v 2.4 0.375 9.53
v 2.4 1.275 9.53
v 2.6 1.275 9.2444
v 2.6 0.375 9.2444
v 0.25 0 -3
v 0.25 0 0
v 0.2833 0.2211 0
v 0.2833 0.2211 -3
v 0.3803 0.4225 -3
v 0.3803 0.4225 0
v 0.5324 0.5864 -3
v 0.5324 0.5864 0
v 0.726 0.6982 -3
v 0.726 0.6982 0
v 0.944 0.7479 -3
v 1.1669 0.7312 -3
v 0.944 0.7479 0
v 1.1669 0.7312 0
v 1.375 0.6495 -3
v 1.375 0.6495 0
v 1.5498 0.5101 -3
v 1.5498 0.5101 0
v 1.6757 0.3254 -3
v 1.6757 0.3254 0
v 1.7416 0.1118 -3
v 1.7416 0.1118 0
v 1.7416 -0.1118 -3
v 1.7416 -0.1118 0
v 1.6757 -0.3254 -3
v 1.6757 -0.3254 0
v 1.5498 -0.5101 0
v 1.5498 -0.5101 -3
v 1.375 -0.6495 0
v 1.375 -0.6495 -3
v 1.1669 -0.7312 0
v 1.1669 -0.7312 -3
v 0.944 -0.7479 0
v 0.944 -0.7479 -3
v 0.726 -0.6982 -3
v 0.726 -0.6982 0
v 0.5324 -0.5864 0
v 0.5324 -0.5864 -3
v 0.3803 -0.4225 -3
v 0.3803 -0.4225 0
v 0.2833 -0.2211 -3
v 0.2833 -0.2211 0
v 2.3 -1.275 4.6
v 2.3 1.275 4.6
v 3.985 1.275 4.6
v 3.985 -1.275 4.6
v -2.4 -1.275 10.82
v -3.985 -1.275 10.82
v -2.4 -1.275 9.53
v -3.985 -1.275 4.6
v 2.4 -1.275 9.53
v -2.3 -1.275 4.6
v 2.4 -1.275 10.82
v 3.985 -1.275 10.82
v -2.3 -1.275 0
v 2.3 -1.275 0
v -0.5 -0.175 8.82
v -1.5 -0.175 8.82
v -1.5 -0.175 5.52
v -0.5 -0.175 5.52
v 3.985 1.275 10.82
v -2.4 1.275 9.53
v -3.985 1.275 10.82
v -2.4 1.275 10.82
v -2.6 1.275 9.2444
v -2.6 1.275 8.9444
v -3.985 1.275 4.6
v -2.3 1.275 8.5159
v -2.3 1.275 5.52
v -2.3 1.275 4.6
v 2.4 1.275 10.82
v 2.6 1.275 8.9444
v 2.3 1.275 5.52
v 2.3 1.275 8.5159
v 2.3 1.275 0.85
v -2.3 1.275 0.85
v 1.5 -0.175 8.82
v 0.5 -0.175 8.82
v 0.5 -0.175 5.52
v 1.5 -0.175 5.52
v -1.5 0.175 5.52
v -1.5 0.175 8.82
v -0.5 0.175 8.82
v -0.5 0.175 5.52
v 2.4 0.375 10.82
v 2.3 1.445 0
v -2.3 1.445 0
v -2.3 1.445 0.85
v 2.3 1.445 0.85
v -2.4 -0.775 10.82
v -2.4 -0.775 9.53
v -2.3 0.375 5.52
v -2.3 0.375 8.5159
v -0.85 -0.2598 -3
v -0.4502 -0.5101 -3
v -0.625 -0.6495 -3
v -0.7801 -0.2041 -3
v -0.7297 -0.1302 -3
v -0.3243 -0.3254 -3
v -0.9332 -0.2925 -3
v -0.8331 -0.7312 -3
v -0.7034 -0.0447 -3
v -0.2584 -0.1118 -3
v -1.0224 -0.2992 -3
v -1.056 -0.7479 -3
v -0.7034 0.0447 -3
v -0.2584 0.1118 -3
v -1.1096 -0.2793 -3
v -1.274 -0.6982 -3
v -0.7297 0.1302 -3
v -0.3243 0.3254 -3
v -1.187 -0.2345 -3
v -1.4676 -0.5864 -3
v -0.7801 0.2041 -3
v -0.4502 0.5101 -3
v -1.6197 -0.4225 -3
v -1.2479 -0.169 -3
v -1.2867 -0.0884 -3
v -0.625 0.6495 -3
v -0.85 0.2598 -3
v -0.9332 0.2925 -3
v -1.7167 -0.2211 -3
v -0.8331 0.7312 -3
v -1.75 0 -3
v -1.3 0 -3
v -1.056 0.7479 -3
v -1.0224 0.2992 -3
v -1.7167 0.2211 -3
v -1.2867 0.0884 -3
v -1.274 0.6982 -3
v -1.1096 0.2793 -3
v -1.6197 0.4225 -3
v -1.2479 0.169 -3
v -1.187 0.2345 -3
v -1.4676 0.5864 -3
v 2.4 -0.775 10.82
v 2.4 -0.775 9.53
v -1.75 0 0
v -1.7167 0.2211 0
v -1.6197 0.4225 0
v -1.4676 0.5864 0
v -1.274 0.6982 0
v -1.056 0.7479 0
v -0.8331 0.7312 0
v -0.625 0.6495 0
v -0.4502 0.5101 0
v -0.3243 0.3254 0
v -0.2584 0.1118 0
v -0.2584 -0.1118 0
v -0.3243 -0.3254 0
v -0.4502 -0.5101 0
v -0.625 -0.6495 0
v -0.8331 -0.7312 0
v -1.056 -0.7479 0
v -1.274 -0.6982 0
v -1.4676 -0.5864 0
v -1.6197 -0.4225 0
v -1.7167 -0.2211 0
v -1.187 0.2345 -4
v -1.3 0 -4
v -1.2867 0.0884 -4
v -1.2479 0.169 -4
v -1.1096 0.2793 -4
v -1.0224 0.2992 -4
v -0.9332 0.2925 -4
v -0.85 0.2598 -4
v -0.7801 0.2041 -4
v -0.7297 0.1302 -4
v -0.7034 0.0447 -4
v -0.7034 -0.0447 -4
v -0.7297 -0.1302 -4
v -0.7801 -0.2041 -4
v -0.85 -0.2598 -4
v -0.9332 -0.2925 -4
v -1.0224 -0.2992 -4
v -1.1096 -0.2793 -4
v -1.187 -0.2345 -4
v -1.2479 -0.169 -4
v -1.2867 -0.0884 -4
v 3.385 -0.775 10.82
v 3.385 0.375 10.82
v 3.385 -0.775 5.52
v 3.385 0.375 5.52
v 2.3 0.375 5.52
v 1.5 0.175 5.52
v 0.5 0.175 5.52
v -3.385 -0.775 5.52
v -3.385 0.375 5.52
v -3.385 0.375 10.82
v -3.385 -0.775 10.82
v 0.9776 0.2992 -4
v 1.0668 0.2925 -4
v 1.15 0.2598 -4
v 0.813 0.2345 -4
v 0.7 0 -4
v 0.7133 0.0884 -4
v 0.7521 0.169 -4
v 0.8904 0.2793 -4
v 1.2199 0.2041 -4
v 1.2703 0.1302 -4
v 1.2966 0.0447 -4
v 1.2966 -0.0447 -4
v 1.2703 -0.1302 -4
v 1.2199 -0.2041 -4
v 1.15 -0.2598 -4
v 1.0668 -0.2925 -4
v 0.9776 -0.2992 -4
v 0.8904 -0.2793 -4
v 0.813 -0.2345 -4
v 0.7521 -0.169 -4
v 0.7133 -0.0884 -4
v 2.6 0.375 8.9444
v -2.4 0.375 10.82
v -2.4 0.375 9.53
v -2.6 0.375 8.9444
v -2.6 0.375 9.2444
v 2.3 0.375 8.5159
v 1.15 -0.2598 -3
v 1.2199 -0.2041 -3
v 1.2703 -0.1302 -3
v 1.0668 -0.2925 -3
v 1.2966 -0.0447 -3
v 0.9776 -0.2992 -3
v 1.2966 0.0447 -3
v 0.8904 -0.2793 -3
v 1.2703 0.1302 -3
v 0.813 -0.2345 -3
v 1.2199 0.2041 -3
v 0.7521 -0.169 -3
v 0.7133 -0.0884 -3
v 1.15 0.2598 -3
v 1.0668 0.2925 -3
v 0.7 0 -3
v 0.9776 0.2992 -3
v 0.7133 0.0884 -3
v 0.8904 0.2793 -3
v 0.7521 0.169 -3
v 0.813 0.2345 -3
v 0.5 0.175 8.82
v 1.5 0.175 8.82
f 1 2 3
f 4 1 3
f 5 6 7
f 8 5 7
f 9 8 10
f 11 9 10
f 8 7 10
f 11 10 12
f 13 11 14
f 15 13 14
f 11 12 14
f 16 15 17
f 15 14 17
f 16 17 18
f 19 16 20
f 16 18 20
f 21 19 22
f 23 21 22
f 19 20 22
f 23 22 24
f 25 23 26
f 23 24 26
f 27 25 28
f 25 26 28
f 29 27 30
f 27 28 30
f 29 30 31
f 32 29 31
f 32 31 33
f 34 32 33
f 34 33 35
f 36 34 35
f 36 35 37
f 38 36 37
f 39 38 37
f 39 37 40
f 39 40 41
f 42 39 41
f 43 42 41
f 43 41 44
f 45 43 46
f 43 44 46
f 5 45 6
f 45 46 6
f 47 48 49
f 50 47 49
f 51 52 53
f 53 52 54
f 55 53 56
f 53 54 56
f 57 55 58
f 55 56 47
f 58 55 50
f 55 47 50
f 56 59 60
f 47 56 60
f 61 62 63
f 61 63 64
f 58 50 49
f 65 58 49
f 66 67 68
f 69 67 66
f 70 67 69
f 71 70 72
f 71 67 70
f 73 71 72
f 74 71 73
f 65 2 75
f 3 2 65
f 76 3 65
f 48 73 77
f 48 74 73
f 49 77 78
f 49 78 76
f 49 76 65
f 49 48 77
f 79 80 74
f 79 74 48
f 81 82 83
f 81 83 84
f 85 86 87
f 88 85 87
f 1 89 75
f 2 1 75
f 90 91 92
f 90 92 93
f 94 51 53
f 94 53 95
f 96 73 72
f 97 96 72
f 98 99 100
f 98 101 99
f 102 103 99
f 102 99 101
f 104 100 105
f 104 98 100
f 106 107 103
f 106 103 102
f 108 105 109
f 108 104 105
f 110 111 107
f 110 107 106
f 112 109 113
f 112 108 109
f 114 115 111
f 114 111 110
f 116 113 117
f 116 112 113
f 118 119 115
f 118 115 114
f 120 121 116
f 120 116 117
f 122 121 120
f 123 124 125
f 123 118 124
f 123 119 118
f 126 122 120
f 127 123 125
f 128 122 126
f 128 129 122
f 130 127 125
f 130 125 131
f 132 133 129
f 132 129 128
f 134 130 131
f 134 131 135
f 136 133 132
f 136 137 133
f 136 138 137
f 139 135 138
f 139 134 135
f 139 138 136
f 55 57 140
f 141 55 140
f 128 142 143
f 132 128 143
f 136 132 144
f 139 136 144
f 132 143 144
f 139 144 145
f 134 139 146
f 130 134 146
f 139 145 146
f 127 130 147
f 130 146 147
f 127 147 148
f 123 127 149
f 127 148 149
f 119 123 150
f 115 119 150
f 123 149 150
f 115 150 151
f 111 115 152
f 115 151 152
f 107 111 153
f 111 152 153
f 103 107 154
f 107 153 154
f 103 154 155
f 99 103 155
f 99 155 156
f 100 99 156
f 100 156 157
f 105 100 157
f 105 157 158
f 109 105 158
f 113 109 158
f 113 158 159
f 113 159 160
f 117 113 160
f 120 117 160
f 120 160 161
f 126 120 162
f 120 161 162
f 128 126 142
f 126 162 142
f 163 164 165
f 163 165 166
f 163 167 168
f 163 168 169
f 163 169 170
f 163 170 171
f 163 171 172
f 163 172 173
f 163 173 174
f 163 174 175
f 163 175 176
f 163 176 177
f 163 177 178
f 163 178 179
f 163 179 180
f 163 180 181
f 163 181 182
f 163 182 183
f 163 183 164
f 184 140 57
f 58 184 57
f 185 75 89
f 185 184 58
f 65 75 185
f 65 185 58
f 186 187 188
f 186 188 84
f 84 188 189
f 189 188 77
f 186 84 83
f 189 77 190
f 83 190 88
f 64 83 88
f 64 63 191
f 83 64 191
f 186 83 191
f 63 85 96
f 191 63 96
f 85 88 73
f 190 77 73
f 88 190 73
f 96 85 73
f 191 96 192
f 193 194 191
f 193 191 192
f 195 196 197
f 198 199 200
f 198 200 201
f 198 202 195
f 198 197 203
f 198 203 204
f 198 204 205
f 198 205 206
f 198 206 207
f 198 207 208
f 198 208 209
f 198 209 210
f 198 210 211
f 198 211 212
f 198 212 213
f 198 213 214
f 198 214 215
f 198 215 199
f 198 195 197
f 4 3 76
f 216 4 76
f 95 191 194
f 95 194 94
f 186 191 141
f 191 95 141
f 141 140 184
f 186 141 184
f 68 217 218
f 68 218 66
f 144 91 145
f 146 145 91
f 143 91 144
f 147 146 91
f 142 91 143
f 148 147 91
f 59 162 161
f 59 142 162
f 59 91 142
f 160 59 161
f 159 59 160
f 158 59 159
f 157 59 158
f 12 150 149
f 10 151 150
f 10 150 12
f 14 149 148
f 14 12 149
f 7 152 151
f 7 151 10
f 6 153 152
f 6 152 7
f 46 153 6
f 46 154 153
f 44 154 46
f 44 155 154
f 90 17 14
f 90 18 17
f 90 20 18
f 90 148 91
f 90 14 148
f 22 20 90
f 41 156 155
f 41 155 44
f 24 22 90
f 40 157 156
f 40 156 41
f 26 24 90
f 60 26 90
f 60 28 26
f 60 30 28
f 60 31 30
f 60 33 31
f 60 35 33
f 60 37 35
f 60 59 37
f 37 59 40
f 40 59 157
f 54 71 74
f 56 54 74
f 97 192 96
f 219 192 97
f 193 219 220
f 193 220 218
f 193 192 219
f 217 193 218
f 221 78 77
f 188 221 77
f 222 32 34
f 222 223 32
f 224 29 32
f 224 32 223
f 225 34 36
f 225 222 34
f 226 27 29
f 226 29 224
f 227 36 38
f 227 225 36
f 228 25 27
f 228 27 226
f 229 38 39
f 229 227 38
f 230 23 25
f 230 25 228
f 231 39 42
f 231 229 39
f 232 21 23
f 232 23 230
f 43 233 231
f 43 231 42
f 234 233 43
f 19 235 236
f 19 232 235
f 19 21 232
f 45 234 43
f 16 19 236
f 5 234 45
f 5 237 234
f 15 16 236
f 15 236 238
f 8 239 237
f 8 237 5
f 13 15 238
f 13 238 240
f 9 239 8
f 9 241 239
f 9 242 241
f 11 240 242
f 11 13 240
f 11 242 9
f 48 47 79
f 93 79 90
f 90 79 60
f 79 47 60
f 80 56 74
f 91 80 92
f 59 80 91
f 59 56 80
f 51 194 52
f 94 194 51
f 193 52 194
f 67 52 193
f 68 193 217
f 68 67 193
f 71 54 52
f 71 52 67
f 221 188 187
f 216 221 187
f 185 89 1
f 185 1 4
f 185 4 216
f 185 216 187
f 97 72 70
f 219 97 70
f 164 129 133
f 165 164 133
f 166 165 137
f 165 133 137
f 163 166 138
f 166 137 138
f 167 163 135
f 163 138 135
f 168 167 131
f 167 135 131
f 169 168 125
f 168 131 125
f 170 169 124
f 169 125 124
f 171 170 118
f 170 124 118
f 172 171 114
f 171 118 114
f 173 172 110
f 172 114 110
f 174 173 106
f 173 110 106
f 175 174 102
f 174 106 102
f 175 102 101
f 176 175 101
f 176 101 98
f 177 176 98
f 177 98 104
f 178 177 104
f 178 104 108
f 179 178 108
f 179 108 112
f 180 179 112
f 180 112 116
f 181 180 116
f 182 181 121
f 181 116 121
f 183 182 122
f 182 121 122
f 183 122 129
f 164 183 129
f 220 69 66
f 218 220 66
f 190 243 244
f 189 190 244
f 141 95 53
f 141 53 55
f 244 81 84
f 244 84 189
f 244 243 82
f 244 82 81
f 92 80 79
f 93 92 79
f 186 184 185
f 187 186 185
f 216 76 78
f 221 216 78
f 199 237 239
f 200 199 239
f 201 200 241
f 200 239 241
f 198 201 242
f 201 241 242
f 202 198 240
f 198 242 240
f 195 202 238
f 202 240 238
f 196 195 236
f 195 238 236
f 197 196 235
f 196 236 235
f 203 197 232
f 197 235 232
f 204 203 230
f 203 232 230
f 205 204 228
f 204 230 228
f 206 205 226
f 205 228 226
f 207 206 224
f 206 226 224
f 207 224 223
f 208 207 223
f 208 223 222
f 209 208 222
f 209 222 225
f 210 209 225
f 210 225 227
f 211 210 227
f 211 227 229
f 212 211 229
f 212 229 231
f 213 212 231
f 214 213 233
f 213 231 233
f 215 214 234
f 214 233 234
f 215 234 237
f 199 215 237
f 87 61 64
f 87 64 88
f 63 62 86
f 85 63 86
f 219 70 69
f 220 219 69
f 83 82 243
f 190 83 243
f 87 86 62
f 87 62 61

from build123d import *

# Parameters (mm, degrees)
SKETCH1_W           = 4.6
SKETCH1_H           = 2.55
BOSS_EXTRUDE1_DEPTH = 4.6
SKETCH2_W           = 7.97
SKETCH2_H           = 2.55
BOSS_EXTRUDE2_DEPTH = 6.22
SKETCH3_W           = 4.6
SKETCH3_H           = 0.85
BOSS_EXTRUDE3_DEPTH = 0.17
SKETCH4_W           = 4.8
SKETCH4_H           = 2.55
CUT_EXTRUDE1_DEPTH  = 1.29
SKETCH5_W           = 6.77
SKETCH5_H           = 1.15
CUT_EXTRUDE2_DEPTH  = 5.3
CUT_EXTRUDE3_REACH  = 4.55
SKETCH7_W           = 1
SKETCH7_H           = 0.35
BOSS_EXTRUDE4_DEPTH = 3.3
SKETCH8_R           = 0.75
BOSS_EXTRUDE5_DEPTH = 3
SKETCH9_R           = 0.3
BOSS_EXTRUDE6_DEPTH = 1


with BuildPart() as part:
    # Sketch1 → Boss-Extrude1 (new body)
    with BuildSketch(Plane.XY):
        Rectangle(SKETCH1_W, SKETCH1_H)
    extrude(amount=BOSS_EXTRUDE1_DEPTH)

    # Sketch2 → Boss-Extrude2 (add)
    with BuildSketch(Plane.XY.offset(4.6)):
        Rectangle(SKETCH2_W, SKETCH2_H)
    extrude(amount=BOSS_EXTRUDE2_DEPTH)

    # Sketch3 → Boss-Extrude3 (add)
    with BuildSketch(Plane(origin=(0, 1.275, 0), x_dir=(1, 0, 0), z_dir=(0, 1, 0))):
        with Locations((0, -0.425)):
            Rectangle(SKETCH3_W, SKETCH3_H)
    extrude(amount=BOSS_EXTRUDE3_DEPTH)

    # Sketch4 → Cut-Extrude1 (cut)
    with BuildSketch(Plane.XY.offset(10.82)):
        Rectangle(SKETCH4_W, SKETCH4_H)
    extrude(amount=-CUT_EXTRUDE1_DEPTH, mode=Mode.SUBTRACT)

    # Sketch5 → Cut-Extrude2 (cut)
    with BuildSketch(Plane.XY.offset(10.82)):
        with Locations((0, -0.2)):
            Rectangle(SKETCH5_W, SKETCH5_H)
    extrude(amount=-CUT_EXTRUDE2_DEPTH, mode=Mode.SUBTRACT)

    # Sketch6 → Cut-Extrude3 (cut, up to next)
    with BuildSketch(Plane(origin=(0, 1.275, 0), x_dir=(1, 0, 0), z_dir=(0, 1, 0)), mode=Mode.PRIVATE) as cut_extrude3_sk1:
        Polygon((2.3, -8.515925997), (2.3, -5.52), (-2.3, -5.52), (-2.3, -8.515925997), (-2.3, -9.53), (2.3, -9.53), align=None)
    cut_extrude3_tool1 = extrude(cut_extrude3_sk1.sketch, amount=-CUT_EXTRUDE3_REACH, mode=Mode.PRIVATE) & part.part
    add(cut_extrude3_tool1.solids().sort_by_distance((0, 1.275, 7.525))[0], mode=Mode.SUBTRACT)
    # Sketch6 → Cut-Extrude3 (cut, up to next)
    with BuildSketch(Plane(origin=(0, 1.275, 0), x_dir=(1, 0, 0), z_dir=(0, 1, 0)), mode=Mode.PRIVATE) as cut_extrude3_sk2:
        Polygon((-2.3, -9.53), (-2.3, -8.515925997), (-2.6, -8.944370399), (-2.6, -9.244370399), (-2.4, -9.53), align=None)
    cut_extrude3_tool2 = extrude(cut_extrude3_sk2.sketch, amount=-CUT_EXTRUDE3_REACH, mode=Mode.PRIVATE) & part.part
    add(cut_extrude3_tool2.solids().sort_by_distance((-2.423539, 1.275, 9.078047))[0], mode=Mode.SUBTRACT)
    # Sketch6 → Cut-Extrude3 (cut, up to next)
    with BuildSketch(Plane(origin=(0, 1.275, 0), x_dir=(1, 0, 0), z_dir=(0, 1, 0)), mode=Mode.PRIVATE) as cut_extrude3_sk3:
        Polygon((2.6, -8.944370399), (2.3, -8.515925997), (2.3, -9.53), (2.4, -9.53), (2.6, -9.244370399), align=None)
    cut_extrude3_tool3 = extrude(cut_extrude3_sk3.sketch, amount=-CUT_EXTRUDE3_REACH, mode=Mode.PRIVATE) & part.part
    add(cut_extrude3_tool3.solids().sort_by_distance((2.423539, 1.275, 9.078047))[0], mode=Mode.SUBTRACT)

    # Sketch7 → Boss-Extrude4 (add)
    with BuildSketch(Plane.XY.offset(5.52)):
        with Locations((1, 0)):
            Rectangle(SKETCH7_W, SKETCH7_H)
        with Locations((-1, 0)):
            Rectangle(SKETCH7_W, SKETCH7_H)
    extrude(amount=BOSS_EXTRUDE4_DEPTH)

    # Sketch8 → Boss-Extrude5 (add)
    with BuildSketch(Plane(origin=(0, 0, 0), x_dir=(-1, 0, 0), z_dir=(0, 0, -1))):
        with Locations((-1, 0)):
            Circle(SKETCH8_R)
        with Locations((1, 0)):
            Circle(SKETCH8_R)
    extrude(amount=BOSS_EXTRUDE5_DEPTH)

    # Sketch9 → Boss-Extrude6 (add)
    with BuildSketch(Plane(origin=(0, 0, -3), x_dir=(-1, 0, 0), z_dir=(0, 0, -1))):
        with Locations((-1, 0)):
            Circle(SKETCH9_R)
        with Locations((1, 0)):
            Circle(SKETCH9_R)
    extrude(amount=BOSS_EXTRUDE6_DEPTH)


solid = part.part
